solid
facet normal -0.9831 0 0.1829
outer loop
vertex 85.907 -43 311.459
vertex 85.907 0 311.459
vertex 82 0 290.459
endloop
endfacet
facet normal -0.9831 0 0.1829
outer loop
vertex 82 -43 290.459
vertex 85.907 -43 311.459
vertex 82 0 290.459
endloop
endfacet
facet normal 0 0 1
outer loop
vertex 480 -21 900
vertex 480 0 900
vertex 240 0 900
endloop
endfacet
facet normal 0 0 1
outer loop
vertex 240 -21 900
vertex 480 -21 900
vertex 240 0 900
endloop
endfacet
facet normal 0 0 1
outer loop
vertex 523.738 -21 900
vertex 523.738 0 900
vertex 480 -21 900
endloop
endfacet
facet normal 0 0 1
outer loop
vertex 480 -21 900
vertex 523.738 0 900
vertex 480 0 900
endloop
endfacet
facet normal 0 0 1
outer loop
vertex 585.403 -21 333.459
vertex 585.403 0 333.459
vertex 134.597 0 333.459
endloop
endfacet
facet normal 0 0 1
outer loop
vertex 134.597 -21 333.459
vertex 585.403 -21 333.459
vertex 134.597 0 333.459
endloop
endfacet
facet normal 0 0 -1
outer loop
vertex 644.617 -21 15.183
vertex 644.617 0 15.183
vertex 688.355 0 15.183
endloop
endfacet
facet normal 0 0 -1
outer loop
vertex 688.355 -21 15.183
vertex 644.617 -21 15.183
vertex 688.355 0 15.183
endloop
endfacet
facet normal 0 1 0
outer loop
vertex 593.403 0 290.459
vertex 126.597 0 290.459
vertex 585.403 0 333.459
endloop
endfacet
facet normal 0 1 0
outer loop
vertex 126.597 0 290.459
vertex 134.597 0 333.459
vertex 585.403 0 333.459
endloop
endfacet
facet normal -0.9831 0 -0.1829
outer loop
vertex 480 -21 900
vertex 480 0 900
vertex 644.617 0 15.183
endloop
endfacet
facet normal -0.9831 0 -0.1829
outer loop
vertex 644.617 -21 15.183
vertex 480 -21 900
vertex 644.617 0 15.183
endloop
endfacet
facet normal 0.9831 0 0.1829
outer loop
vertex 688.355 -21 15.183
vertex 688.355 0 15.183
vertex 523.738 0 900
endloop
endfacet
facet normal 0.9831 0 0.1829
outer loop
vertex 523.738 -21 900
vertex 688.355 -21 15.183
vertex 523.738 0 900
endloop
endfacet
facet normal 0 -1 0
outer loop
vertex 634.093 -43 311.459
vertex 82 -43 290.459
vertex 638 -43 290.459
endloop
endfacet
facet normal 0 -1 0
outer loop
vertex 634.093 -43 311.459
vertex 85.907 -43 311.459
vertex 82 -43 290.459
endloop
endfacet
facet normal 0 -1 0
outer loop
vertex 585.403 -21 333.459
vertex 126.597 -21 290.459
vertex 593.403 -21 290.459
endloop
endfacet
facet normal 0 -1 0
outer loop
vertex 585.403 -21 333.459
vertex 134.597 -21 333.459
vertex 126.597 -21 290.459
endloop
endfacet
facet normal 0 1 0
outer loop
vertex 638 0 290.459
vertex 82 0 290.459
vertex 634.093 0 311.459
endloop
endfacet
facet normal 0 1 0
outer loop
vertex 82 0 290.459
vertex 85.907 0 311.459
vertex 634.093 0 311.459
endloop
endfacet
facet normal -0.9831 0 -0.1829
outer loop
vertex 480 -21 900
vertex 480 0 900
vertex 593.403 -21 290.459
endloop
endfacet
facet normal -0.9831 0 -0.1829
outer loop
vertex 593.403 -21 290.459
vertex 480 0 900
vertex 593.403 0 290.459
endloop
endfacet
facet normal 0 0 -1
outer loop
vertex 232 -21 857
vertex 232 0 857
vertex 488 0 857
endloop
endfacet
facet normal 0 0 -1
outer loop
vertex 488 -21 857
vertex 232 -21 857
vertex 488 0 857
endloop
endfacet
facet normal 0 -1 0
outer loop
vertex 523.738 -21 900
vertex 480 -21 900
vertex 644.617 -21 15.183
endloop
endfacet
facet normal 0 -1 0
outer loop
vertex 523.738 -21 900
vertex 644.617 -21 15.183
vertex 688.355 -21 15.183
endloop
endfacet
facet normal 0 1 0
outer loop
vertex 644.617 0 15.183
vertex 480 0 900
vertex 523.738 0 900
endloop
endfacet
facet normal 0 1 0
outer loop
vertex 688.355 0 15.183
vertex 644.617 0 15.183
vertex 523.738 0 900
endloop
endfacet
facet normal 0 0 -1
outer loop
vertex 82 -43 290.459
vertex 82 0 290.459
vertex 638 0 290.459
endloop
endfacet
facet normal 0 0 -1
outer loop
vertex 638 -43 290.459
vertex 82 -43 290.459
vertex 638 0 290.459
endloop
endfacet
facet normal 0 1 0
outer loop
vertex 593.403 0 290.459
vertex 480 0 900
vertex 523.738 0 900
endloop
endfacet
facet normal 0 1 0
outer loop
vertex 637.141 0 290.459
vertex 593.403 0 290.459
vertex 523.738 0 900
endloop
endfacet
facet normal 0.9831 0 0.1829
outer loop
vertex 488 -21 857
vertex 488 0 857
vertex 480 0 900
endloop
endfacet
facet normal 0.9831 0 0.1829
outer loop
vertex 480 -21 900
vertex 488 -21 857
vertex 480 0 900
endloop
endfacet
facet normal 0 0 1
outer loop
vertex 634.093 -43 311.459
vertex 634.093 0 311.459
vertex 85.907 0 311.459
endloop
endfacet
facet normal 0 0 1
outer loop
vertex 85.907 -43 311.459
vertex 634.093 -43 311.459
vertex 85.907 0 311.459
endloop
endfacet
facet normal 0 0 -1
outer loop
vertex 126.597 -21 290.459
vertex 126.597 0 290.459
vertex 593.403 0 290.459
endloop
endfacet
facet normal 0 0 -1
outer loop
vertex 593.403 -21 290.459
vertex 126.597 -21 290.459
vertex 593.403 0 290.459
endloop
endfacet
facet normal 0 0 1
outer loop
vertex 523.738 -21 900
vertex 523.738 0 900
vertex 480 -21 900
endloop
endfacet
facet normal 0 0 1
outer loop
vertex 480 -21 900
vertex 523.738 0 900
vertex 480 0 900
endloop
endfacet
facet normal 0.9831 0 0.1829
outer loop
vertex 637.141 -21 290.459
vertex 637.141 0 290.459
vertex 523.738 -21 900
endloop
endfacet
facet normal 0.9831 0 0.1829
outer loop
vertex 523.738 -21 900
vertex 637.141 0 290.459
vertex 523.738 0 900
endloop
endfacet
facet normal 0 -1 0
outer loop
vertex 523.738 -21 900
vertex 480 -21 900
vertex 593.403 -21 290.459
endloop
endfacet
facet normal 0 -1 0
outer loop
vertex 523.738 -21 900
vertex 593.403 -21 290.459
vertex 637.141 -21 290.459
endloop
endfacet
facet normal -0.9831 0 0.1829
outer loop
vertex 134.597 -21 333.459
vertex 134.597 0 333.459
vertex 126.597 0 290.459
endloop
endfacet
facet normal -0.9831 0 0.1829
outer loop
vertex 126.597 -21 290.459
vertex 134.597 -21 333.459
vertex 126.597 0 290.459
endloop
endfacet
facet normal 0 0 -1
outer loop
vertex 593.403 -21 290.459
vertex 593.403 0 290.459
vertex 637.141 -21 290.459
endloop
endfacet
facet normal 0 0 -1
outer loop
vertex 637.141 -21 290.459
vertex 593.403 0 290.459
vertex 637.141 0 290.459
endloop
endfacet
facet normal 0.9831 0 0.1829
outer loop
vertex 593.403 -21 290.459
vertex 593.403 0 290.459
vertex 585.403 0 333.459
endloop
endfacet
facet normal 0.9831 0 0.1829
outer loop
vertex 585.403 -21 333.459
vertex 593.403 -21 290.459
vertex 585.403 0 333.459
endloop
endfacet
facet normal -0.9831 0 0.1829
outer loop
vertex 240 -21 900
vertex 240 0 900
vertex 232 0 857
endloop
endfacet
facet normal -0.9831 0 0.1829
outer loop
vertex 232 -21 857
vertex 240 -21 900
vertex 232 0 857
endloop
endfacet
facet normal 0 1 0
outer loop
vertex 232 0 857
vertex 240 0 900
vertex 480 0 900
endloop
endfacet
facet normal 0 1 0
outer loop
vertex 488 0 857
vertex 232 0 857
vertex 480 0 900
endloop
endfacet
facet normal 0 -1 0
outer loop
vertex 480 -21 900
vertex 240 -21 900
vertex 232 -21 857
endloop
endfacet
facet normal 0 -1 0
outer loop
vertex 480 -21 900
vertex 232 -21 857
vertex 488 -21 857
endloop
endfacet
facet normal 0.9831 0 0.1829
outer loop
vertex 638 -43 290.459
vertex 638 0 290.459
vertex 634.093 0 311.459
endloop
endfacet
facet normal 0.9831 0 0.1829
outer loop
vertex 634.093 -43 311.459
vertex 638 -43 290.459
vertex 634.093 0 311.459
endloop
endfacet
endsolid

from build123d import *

# Parameters (mm, degrees)
F8_DEPTH  = 21
F9_DEPTH  = 21
F10_DEPTH = 21
F11_DEPTH = 21
F12_DEPTH = 43


with BuildPart() as f8:
    # F3 (on Front) → F8 (new body)
    with BuildSketch(Plane.XZ):
        Polygon((688.3549800219, 15.1829554648), (523.7378554573, 900), (480, 900), (644.6171245647, 15.1829554648), align=None)
    extrude(amount=F8_DEPTH)


with BuildPart() as f9:
    # F4 (on Front) → F9 (new body)
    with BuildSketch(Plane.XZ):
        Polygon((480, 900), (593.4029080334, 290.4593693202), (637.1407634907, 290.4593693202), (523.7378554573, 900), align=None)
    extrude(amount=F9_DEPTH)


with BuildPart() as f10:
    # F5 (on Front) → F10 (new body)
    with BuildSketch(Plane.XZ):
        Polygon((480, 900), (360, 900), (240, 900), (232, 857), (360, 857), (488, 857), align=None)
    extrude(amount=F10_DEPTH)


with BuildPart() as f11:
    # F6 (on Front) → F11 (new body)
    with BuildSketch(Plane.XZ):
        Polygon((126.5970919666, 290.4593693202), (360, 290.4593693202), (593.4029080334, 290.4593693202), (585.4029080334, 333.4593693202), (360, 333.4593693202), (134.5970919666, 333.4593693202), align=None)
    extrude(amount=F11_DEPTH)


with BuildPart() as f12:
    # F7 (on Front) → F12 (new body)
    with BuildSketch(Plane.XZ):
        Polygon((82, 290.4593693202), (360, 290.4593693202), (638, 290.4593693202), (634.0930232558, 311.4593693202), (360, 311.4593693202), (85.9069767442, 311.4593693202), align=None)
    extrude(amount=F12_DEPTH)


solid = Compound([f8.part, f9.part, f10.part, f11.part, f12.part])
